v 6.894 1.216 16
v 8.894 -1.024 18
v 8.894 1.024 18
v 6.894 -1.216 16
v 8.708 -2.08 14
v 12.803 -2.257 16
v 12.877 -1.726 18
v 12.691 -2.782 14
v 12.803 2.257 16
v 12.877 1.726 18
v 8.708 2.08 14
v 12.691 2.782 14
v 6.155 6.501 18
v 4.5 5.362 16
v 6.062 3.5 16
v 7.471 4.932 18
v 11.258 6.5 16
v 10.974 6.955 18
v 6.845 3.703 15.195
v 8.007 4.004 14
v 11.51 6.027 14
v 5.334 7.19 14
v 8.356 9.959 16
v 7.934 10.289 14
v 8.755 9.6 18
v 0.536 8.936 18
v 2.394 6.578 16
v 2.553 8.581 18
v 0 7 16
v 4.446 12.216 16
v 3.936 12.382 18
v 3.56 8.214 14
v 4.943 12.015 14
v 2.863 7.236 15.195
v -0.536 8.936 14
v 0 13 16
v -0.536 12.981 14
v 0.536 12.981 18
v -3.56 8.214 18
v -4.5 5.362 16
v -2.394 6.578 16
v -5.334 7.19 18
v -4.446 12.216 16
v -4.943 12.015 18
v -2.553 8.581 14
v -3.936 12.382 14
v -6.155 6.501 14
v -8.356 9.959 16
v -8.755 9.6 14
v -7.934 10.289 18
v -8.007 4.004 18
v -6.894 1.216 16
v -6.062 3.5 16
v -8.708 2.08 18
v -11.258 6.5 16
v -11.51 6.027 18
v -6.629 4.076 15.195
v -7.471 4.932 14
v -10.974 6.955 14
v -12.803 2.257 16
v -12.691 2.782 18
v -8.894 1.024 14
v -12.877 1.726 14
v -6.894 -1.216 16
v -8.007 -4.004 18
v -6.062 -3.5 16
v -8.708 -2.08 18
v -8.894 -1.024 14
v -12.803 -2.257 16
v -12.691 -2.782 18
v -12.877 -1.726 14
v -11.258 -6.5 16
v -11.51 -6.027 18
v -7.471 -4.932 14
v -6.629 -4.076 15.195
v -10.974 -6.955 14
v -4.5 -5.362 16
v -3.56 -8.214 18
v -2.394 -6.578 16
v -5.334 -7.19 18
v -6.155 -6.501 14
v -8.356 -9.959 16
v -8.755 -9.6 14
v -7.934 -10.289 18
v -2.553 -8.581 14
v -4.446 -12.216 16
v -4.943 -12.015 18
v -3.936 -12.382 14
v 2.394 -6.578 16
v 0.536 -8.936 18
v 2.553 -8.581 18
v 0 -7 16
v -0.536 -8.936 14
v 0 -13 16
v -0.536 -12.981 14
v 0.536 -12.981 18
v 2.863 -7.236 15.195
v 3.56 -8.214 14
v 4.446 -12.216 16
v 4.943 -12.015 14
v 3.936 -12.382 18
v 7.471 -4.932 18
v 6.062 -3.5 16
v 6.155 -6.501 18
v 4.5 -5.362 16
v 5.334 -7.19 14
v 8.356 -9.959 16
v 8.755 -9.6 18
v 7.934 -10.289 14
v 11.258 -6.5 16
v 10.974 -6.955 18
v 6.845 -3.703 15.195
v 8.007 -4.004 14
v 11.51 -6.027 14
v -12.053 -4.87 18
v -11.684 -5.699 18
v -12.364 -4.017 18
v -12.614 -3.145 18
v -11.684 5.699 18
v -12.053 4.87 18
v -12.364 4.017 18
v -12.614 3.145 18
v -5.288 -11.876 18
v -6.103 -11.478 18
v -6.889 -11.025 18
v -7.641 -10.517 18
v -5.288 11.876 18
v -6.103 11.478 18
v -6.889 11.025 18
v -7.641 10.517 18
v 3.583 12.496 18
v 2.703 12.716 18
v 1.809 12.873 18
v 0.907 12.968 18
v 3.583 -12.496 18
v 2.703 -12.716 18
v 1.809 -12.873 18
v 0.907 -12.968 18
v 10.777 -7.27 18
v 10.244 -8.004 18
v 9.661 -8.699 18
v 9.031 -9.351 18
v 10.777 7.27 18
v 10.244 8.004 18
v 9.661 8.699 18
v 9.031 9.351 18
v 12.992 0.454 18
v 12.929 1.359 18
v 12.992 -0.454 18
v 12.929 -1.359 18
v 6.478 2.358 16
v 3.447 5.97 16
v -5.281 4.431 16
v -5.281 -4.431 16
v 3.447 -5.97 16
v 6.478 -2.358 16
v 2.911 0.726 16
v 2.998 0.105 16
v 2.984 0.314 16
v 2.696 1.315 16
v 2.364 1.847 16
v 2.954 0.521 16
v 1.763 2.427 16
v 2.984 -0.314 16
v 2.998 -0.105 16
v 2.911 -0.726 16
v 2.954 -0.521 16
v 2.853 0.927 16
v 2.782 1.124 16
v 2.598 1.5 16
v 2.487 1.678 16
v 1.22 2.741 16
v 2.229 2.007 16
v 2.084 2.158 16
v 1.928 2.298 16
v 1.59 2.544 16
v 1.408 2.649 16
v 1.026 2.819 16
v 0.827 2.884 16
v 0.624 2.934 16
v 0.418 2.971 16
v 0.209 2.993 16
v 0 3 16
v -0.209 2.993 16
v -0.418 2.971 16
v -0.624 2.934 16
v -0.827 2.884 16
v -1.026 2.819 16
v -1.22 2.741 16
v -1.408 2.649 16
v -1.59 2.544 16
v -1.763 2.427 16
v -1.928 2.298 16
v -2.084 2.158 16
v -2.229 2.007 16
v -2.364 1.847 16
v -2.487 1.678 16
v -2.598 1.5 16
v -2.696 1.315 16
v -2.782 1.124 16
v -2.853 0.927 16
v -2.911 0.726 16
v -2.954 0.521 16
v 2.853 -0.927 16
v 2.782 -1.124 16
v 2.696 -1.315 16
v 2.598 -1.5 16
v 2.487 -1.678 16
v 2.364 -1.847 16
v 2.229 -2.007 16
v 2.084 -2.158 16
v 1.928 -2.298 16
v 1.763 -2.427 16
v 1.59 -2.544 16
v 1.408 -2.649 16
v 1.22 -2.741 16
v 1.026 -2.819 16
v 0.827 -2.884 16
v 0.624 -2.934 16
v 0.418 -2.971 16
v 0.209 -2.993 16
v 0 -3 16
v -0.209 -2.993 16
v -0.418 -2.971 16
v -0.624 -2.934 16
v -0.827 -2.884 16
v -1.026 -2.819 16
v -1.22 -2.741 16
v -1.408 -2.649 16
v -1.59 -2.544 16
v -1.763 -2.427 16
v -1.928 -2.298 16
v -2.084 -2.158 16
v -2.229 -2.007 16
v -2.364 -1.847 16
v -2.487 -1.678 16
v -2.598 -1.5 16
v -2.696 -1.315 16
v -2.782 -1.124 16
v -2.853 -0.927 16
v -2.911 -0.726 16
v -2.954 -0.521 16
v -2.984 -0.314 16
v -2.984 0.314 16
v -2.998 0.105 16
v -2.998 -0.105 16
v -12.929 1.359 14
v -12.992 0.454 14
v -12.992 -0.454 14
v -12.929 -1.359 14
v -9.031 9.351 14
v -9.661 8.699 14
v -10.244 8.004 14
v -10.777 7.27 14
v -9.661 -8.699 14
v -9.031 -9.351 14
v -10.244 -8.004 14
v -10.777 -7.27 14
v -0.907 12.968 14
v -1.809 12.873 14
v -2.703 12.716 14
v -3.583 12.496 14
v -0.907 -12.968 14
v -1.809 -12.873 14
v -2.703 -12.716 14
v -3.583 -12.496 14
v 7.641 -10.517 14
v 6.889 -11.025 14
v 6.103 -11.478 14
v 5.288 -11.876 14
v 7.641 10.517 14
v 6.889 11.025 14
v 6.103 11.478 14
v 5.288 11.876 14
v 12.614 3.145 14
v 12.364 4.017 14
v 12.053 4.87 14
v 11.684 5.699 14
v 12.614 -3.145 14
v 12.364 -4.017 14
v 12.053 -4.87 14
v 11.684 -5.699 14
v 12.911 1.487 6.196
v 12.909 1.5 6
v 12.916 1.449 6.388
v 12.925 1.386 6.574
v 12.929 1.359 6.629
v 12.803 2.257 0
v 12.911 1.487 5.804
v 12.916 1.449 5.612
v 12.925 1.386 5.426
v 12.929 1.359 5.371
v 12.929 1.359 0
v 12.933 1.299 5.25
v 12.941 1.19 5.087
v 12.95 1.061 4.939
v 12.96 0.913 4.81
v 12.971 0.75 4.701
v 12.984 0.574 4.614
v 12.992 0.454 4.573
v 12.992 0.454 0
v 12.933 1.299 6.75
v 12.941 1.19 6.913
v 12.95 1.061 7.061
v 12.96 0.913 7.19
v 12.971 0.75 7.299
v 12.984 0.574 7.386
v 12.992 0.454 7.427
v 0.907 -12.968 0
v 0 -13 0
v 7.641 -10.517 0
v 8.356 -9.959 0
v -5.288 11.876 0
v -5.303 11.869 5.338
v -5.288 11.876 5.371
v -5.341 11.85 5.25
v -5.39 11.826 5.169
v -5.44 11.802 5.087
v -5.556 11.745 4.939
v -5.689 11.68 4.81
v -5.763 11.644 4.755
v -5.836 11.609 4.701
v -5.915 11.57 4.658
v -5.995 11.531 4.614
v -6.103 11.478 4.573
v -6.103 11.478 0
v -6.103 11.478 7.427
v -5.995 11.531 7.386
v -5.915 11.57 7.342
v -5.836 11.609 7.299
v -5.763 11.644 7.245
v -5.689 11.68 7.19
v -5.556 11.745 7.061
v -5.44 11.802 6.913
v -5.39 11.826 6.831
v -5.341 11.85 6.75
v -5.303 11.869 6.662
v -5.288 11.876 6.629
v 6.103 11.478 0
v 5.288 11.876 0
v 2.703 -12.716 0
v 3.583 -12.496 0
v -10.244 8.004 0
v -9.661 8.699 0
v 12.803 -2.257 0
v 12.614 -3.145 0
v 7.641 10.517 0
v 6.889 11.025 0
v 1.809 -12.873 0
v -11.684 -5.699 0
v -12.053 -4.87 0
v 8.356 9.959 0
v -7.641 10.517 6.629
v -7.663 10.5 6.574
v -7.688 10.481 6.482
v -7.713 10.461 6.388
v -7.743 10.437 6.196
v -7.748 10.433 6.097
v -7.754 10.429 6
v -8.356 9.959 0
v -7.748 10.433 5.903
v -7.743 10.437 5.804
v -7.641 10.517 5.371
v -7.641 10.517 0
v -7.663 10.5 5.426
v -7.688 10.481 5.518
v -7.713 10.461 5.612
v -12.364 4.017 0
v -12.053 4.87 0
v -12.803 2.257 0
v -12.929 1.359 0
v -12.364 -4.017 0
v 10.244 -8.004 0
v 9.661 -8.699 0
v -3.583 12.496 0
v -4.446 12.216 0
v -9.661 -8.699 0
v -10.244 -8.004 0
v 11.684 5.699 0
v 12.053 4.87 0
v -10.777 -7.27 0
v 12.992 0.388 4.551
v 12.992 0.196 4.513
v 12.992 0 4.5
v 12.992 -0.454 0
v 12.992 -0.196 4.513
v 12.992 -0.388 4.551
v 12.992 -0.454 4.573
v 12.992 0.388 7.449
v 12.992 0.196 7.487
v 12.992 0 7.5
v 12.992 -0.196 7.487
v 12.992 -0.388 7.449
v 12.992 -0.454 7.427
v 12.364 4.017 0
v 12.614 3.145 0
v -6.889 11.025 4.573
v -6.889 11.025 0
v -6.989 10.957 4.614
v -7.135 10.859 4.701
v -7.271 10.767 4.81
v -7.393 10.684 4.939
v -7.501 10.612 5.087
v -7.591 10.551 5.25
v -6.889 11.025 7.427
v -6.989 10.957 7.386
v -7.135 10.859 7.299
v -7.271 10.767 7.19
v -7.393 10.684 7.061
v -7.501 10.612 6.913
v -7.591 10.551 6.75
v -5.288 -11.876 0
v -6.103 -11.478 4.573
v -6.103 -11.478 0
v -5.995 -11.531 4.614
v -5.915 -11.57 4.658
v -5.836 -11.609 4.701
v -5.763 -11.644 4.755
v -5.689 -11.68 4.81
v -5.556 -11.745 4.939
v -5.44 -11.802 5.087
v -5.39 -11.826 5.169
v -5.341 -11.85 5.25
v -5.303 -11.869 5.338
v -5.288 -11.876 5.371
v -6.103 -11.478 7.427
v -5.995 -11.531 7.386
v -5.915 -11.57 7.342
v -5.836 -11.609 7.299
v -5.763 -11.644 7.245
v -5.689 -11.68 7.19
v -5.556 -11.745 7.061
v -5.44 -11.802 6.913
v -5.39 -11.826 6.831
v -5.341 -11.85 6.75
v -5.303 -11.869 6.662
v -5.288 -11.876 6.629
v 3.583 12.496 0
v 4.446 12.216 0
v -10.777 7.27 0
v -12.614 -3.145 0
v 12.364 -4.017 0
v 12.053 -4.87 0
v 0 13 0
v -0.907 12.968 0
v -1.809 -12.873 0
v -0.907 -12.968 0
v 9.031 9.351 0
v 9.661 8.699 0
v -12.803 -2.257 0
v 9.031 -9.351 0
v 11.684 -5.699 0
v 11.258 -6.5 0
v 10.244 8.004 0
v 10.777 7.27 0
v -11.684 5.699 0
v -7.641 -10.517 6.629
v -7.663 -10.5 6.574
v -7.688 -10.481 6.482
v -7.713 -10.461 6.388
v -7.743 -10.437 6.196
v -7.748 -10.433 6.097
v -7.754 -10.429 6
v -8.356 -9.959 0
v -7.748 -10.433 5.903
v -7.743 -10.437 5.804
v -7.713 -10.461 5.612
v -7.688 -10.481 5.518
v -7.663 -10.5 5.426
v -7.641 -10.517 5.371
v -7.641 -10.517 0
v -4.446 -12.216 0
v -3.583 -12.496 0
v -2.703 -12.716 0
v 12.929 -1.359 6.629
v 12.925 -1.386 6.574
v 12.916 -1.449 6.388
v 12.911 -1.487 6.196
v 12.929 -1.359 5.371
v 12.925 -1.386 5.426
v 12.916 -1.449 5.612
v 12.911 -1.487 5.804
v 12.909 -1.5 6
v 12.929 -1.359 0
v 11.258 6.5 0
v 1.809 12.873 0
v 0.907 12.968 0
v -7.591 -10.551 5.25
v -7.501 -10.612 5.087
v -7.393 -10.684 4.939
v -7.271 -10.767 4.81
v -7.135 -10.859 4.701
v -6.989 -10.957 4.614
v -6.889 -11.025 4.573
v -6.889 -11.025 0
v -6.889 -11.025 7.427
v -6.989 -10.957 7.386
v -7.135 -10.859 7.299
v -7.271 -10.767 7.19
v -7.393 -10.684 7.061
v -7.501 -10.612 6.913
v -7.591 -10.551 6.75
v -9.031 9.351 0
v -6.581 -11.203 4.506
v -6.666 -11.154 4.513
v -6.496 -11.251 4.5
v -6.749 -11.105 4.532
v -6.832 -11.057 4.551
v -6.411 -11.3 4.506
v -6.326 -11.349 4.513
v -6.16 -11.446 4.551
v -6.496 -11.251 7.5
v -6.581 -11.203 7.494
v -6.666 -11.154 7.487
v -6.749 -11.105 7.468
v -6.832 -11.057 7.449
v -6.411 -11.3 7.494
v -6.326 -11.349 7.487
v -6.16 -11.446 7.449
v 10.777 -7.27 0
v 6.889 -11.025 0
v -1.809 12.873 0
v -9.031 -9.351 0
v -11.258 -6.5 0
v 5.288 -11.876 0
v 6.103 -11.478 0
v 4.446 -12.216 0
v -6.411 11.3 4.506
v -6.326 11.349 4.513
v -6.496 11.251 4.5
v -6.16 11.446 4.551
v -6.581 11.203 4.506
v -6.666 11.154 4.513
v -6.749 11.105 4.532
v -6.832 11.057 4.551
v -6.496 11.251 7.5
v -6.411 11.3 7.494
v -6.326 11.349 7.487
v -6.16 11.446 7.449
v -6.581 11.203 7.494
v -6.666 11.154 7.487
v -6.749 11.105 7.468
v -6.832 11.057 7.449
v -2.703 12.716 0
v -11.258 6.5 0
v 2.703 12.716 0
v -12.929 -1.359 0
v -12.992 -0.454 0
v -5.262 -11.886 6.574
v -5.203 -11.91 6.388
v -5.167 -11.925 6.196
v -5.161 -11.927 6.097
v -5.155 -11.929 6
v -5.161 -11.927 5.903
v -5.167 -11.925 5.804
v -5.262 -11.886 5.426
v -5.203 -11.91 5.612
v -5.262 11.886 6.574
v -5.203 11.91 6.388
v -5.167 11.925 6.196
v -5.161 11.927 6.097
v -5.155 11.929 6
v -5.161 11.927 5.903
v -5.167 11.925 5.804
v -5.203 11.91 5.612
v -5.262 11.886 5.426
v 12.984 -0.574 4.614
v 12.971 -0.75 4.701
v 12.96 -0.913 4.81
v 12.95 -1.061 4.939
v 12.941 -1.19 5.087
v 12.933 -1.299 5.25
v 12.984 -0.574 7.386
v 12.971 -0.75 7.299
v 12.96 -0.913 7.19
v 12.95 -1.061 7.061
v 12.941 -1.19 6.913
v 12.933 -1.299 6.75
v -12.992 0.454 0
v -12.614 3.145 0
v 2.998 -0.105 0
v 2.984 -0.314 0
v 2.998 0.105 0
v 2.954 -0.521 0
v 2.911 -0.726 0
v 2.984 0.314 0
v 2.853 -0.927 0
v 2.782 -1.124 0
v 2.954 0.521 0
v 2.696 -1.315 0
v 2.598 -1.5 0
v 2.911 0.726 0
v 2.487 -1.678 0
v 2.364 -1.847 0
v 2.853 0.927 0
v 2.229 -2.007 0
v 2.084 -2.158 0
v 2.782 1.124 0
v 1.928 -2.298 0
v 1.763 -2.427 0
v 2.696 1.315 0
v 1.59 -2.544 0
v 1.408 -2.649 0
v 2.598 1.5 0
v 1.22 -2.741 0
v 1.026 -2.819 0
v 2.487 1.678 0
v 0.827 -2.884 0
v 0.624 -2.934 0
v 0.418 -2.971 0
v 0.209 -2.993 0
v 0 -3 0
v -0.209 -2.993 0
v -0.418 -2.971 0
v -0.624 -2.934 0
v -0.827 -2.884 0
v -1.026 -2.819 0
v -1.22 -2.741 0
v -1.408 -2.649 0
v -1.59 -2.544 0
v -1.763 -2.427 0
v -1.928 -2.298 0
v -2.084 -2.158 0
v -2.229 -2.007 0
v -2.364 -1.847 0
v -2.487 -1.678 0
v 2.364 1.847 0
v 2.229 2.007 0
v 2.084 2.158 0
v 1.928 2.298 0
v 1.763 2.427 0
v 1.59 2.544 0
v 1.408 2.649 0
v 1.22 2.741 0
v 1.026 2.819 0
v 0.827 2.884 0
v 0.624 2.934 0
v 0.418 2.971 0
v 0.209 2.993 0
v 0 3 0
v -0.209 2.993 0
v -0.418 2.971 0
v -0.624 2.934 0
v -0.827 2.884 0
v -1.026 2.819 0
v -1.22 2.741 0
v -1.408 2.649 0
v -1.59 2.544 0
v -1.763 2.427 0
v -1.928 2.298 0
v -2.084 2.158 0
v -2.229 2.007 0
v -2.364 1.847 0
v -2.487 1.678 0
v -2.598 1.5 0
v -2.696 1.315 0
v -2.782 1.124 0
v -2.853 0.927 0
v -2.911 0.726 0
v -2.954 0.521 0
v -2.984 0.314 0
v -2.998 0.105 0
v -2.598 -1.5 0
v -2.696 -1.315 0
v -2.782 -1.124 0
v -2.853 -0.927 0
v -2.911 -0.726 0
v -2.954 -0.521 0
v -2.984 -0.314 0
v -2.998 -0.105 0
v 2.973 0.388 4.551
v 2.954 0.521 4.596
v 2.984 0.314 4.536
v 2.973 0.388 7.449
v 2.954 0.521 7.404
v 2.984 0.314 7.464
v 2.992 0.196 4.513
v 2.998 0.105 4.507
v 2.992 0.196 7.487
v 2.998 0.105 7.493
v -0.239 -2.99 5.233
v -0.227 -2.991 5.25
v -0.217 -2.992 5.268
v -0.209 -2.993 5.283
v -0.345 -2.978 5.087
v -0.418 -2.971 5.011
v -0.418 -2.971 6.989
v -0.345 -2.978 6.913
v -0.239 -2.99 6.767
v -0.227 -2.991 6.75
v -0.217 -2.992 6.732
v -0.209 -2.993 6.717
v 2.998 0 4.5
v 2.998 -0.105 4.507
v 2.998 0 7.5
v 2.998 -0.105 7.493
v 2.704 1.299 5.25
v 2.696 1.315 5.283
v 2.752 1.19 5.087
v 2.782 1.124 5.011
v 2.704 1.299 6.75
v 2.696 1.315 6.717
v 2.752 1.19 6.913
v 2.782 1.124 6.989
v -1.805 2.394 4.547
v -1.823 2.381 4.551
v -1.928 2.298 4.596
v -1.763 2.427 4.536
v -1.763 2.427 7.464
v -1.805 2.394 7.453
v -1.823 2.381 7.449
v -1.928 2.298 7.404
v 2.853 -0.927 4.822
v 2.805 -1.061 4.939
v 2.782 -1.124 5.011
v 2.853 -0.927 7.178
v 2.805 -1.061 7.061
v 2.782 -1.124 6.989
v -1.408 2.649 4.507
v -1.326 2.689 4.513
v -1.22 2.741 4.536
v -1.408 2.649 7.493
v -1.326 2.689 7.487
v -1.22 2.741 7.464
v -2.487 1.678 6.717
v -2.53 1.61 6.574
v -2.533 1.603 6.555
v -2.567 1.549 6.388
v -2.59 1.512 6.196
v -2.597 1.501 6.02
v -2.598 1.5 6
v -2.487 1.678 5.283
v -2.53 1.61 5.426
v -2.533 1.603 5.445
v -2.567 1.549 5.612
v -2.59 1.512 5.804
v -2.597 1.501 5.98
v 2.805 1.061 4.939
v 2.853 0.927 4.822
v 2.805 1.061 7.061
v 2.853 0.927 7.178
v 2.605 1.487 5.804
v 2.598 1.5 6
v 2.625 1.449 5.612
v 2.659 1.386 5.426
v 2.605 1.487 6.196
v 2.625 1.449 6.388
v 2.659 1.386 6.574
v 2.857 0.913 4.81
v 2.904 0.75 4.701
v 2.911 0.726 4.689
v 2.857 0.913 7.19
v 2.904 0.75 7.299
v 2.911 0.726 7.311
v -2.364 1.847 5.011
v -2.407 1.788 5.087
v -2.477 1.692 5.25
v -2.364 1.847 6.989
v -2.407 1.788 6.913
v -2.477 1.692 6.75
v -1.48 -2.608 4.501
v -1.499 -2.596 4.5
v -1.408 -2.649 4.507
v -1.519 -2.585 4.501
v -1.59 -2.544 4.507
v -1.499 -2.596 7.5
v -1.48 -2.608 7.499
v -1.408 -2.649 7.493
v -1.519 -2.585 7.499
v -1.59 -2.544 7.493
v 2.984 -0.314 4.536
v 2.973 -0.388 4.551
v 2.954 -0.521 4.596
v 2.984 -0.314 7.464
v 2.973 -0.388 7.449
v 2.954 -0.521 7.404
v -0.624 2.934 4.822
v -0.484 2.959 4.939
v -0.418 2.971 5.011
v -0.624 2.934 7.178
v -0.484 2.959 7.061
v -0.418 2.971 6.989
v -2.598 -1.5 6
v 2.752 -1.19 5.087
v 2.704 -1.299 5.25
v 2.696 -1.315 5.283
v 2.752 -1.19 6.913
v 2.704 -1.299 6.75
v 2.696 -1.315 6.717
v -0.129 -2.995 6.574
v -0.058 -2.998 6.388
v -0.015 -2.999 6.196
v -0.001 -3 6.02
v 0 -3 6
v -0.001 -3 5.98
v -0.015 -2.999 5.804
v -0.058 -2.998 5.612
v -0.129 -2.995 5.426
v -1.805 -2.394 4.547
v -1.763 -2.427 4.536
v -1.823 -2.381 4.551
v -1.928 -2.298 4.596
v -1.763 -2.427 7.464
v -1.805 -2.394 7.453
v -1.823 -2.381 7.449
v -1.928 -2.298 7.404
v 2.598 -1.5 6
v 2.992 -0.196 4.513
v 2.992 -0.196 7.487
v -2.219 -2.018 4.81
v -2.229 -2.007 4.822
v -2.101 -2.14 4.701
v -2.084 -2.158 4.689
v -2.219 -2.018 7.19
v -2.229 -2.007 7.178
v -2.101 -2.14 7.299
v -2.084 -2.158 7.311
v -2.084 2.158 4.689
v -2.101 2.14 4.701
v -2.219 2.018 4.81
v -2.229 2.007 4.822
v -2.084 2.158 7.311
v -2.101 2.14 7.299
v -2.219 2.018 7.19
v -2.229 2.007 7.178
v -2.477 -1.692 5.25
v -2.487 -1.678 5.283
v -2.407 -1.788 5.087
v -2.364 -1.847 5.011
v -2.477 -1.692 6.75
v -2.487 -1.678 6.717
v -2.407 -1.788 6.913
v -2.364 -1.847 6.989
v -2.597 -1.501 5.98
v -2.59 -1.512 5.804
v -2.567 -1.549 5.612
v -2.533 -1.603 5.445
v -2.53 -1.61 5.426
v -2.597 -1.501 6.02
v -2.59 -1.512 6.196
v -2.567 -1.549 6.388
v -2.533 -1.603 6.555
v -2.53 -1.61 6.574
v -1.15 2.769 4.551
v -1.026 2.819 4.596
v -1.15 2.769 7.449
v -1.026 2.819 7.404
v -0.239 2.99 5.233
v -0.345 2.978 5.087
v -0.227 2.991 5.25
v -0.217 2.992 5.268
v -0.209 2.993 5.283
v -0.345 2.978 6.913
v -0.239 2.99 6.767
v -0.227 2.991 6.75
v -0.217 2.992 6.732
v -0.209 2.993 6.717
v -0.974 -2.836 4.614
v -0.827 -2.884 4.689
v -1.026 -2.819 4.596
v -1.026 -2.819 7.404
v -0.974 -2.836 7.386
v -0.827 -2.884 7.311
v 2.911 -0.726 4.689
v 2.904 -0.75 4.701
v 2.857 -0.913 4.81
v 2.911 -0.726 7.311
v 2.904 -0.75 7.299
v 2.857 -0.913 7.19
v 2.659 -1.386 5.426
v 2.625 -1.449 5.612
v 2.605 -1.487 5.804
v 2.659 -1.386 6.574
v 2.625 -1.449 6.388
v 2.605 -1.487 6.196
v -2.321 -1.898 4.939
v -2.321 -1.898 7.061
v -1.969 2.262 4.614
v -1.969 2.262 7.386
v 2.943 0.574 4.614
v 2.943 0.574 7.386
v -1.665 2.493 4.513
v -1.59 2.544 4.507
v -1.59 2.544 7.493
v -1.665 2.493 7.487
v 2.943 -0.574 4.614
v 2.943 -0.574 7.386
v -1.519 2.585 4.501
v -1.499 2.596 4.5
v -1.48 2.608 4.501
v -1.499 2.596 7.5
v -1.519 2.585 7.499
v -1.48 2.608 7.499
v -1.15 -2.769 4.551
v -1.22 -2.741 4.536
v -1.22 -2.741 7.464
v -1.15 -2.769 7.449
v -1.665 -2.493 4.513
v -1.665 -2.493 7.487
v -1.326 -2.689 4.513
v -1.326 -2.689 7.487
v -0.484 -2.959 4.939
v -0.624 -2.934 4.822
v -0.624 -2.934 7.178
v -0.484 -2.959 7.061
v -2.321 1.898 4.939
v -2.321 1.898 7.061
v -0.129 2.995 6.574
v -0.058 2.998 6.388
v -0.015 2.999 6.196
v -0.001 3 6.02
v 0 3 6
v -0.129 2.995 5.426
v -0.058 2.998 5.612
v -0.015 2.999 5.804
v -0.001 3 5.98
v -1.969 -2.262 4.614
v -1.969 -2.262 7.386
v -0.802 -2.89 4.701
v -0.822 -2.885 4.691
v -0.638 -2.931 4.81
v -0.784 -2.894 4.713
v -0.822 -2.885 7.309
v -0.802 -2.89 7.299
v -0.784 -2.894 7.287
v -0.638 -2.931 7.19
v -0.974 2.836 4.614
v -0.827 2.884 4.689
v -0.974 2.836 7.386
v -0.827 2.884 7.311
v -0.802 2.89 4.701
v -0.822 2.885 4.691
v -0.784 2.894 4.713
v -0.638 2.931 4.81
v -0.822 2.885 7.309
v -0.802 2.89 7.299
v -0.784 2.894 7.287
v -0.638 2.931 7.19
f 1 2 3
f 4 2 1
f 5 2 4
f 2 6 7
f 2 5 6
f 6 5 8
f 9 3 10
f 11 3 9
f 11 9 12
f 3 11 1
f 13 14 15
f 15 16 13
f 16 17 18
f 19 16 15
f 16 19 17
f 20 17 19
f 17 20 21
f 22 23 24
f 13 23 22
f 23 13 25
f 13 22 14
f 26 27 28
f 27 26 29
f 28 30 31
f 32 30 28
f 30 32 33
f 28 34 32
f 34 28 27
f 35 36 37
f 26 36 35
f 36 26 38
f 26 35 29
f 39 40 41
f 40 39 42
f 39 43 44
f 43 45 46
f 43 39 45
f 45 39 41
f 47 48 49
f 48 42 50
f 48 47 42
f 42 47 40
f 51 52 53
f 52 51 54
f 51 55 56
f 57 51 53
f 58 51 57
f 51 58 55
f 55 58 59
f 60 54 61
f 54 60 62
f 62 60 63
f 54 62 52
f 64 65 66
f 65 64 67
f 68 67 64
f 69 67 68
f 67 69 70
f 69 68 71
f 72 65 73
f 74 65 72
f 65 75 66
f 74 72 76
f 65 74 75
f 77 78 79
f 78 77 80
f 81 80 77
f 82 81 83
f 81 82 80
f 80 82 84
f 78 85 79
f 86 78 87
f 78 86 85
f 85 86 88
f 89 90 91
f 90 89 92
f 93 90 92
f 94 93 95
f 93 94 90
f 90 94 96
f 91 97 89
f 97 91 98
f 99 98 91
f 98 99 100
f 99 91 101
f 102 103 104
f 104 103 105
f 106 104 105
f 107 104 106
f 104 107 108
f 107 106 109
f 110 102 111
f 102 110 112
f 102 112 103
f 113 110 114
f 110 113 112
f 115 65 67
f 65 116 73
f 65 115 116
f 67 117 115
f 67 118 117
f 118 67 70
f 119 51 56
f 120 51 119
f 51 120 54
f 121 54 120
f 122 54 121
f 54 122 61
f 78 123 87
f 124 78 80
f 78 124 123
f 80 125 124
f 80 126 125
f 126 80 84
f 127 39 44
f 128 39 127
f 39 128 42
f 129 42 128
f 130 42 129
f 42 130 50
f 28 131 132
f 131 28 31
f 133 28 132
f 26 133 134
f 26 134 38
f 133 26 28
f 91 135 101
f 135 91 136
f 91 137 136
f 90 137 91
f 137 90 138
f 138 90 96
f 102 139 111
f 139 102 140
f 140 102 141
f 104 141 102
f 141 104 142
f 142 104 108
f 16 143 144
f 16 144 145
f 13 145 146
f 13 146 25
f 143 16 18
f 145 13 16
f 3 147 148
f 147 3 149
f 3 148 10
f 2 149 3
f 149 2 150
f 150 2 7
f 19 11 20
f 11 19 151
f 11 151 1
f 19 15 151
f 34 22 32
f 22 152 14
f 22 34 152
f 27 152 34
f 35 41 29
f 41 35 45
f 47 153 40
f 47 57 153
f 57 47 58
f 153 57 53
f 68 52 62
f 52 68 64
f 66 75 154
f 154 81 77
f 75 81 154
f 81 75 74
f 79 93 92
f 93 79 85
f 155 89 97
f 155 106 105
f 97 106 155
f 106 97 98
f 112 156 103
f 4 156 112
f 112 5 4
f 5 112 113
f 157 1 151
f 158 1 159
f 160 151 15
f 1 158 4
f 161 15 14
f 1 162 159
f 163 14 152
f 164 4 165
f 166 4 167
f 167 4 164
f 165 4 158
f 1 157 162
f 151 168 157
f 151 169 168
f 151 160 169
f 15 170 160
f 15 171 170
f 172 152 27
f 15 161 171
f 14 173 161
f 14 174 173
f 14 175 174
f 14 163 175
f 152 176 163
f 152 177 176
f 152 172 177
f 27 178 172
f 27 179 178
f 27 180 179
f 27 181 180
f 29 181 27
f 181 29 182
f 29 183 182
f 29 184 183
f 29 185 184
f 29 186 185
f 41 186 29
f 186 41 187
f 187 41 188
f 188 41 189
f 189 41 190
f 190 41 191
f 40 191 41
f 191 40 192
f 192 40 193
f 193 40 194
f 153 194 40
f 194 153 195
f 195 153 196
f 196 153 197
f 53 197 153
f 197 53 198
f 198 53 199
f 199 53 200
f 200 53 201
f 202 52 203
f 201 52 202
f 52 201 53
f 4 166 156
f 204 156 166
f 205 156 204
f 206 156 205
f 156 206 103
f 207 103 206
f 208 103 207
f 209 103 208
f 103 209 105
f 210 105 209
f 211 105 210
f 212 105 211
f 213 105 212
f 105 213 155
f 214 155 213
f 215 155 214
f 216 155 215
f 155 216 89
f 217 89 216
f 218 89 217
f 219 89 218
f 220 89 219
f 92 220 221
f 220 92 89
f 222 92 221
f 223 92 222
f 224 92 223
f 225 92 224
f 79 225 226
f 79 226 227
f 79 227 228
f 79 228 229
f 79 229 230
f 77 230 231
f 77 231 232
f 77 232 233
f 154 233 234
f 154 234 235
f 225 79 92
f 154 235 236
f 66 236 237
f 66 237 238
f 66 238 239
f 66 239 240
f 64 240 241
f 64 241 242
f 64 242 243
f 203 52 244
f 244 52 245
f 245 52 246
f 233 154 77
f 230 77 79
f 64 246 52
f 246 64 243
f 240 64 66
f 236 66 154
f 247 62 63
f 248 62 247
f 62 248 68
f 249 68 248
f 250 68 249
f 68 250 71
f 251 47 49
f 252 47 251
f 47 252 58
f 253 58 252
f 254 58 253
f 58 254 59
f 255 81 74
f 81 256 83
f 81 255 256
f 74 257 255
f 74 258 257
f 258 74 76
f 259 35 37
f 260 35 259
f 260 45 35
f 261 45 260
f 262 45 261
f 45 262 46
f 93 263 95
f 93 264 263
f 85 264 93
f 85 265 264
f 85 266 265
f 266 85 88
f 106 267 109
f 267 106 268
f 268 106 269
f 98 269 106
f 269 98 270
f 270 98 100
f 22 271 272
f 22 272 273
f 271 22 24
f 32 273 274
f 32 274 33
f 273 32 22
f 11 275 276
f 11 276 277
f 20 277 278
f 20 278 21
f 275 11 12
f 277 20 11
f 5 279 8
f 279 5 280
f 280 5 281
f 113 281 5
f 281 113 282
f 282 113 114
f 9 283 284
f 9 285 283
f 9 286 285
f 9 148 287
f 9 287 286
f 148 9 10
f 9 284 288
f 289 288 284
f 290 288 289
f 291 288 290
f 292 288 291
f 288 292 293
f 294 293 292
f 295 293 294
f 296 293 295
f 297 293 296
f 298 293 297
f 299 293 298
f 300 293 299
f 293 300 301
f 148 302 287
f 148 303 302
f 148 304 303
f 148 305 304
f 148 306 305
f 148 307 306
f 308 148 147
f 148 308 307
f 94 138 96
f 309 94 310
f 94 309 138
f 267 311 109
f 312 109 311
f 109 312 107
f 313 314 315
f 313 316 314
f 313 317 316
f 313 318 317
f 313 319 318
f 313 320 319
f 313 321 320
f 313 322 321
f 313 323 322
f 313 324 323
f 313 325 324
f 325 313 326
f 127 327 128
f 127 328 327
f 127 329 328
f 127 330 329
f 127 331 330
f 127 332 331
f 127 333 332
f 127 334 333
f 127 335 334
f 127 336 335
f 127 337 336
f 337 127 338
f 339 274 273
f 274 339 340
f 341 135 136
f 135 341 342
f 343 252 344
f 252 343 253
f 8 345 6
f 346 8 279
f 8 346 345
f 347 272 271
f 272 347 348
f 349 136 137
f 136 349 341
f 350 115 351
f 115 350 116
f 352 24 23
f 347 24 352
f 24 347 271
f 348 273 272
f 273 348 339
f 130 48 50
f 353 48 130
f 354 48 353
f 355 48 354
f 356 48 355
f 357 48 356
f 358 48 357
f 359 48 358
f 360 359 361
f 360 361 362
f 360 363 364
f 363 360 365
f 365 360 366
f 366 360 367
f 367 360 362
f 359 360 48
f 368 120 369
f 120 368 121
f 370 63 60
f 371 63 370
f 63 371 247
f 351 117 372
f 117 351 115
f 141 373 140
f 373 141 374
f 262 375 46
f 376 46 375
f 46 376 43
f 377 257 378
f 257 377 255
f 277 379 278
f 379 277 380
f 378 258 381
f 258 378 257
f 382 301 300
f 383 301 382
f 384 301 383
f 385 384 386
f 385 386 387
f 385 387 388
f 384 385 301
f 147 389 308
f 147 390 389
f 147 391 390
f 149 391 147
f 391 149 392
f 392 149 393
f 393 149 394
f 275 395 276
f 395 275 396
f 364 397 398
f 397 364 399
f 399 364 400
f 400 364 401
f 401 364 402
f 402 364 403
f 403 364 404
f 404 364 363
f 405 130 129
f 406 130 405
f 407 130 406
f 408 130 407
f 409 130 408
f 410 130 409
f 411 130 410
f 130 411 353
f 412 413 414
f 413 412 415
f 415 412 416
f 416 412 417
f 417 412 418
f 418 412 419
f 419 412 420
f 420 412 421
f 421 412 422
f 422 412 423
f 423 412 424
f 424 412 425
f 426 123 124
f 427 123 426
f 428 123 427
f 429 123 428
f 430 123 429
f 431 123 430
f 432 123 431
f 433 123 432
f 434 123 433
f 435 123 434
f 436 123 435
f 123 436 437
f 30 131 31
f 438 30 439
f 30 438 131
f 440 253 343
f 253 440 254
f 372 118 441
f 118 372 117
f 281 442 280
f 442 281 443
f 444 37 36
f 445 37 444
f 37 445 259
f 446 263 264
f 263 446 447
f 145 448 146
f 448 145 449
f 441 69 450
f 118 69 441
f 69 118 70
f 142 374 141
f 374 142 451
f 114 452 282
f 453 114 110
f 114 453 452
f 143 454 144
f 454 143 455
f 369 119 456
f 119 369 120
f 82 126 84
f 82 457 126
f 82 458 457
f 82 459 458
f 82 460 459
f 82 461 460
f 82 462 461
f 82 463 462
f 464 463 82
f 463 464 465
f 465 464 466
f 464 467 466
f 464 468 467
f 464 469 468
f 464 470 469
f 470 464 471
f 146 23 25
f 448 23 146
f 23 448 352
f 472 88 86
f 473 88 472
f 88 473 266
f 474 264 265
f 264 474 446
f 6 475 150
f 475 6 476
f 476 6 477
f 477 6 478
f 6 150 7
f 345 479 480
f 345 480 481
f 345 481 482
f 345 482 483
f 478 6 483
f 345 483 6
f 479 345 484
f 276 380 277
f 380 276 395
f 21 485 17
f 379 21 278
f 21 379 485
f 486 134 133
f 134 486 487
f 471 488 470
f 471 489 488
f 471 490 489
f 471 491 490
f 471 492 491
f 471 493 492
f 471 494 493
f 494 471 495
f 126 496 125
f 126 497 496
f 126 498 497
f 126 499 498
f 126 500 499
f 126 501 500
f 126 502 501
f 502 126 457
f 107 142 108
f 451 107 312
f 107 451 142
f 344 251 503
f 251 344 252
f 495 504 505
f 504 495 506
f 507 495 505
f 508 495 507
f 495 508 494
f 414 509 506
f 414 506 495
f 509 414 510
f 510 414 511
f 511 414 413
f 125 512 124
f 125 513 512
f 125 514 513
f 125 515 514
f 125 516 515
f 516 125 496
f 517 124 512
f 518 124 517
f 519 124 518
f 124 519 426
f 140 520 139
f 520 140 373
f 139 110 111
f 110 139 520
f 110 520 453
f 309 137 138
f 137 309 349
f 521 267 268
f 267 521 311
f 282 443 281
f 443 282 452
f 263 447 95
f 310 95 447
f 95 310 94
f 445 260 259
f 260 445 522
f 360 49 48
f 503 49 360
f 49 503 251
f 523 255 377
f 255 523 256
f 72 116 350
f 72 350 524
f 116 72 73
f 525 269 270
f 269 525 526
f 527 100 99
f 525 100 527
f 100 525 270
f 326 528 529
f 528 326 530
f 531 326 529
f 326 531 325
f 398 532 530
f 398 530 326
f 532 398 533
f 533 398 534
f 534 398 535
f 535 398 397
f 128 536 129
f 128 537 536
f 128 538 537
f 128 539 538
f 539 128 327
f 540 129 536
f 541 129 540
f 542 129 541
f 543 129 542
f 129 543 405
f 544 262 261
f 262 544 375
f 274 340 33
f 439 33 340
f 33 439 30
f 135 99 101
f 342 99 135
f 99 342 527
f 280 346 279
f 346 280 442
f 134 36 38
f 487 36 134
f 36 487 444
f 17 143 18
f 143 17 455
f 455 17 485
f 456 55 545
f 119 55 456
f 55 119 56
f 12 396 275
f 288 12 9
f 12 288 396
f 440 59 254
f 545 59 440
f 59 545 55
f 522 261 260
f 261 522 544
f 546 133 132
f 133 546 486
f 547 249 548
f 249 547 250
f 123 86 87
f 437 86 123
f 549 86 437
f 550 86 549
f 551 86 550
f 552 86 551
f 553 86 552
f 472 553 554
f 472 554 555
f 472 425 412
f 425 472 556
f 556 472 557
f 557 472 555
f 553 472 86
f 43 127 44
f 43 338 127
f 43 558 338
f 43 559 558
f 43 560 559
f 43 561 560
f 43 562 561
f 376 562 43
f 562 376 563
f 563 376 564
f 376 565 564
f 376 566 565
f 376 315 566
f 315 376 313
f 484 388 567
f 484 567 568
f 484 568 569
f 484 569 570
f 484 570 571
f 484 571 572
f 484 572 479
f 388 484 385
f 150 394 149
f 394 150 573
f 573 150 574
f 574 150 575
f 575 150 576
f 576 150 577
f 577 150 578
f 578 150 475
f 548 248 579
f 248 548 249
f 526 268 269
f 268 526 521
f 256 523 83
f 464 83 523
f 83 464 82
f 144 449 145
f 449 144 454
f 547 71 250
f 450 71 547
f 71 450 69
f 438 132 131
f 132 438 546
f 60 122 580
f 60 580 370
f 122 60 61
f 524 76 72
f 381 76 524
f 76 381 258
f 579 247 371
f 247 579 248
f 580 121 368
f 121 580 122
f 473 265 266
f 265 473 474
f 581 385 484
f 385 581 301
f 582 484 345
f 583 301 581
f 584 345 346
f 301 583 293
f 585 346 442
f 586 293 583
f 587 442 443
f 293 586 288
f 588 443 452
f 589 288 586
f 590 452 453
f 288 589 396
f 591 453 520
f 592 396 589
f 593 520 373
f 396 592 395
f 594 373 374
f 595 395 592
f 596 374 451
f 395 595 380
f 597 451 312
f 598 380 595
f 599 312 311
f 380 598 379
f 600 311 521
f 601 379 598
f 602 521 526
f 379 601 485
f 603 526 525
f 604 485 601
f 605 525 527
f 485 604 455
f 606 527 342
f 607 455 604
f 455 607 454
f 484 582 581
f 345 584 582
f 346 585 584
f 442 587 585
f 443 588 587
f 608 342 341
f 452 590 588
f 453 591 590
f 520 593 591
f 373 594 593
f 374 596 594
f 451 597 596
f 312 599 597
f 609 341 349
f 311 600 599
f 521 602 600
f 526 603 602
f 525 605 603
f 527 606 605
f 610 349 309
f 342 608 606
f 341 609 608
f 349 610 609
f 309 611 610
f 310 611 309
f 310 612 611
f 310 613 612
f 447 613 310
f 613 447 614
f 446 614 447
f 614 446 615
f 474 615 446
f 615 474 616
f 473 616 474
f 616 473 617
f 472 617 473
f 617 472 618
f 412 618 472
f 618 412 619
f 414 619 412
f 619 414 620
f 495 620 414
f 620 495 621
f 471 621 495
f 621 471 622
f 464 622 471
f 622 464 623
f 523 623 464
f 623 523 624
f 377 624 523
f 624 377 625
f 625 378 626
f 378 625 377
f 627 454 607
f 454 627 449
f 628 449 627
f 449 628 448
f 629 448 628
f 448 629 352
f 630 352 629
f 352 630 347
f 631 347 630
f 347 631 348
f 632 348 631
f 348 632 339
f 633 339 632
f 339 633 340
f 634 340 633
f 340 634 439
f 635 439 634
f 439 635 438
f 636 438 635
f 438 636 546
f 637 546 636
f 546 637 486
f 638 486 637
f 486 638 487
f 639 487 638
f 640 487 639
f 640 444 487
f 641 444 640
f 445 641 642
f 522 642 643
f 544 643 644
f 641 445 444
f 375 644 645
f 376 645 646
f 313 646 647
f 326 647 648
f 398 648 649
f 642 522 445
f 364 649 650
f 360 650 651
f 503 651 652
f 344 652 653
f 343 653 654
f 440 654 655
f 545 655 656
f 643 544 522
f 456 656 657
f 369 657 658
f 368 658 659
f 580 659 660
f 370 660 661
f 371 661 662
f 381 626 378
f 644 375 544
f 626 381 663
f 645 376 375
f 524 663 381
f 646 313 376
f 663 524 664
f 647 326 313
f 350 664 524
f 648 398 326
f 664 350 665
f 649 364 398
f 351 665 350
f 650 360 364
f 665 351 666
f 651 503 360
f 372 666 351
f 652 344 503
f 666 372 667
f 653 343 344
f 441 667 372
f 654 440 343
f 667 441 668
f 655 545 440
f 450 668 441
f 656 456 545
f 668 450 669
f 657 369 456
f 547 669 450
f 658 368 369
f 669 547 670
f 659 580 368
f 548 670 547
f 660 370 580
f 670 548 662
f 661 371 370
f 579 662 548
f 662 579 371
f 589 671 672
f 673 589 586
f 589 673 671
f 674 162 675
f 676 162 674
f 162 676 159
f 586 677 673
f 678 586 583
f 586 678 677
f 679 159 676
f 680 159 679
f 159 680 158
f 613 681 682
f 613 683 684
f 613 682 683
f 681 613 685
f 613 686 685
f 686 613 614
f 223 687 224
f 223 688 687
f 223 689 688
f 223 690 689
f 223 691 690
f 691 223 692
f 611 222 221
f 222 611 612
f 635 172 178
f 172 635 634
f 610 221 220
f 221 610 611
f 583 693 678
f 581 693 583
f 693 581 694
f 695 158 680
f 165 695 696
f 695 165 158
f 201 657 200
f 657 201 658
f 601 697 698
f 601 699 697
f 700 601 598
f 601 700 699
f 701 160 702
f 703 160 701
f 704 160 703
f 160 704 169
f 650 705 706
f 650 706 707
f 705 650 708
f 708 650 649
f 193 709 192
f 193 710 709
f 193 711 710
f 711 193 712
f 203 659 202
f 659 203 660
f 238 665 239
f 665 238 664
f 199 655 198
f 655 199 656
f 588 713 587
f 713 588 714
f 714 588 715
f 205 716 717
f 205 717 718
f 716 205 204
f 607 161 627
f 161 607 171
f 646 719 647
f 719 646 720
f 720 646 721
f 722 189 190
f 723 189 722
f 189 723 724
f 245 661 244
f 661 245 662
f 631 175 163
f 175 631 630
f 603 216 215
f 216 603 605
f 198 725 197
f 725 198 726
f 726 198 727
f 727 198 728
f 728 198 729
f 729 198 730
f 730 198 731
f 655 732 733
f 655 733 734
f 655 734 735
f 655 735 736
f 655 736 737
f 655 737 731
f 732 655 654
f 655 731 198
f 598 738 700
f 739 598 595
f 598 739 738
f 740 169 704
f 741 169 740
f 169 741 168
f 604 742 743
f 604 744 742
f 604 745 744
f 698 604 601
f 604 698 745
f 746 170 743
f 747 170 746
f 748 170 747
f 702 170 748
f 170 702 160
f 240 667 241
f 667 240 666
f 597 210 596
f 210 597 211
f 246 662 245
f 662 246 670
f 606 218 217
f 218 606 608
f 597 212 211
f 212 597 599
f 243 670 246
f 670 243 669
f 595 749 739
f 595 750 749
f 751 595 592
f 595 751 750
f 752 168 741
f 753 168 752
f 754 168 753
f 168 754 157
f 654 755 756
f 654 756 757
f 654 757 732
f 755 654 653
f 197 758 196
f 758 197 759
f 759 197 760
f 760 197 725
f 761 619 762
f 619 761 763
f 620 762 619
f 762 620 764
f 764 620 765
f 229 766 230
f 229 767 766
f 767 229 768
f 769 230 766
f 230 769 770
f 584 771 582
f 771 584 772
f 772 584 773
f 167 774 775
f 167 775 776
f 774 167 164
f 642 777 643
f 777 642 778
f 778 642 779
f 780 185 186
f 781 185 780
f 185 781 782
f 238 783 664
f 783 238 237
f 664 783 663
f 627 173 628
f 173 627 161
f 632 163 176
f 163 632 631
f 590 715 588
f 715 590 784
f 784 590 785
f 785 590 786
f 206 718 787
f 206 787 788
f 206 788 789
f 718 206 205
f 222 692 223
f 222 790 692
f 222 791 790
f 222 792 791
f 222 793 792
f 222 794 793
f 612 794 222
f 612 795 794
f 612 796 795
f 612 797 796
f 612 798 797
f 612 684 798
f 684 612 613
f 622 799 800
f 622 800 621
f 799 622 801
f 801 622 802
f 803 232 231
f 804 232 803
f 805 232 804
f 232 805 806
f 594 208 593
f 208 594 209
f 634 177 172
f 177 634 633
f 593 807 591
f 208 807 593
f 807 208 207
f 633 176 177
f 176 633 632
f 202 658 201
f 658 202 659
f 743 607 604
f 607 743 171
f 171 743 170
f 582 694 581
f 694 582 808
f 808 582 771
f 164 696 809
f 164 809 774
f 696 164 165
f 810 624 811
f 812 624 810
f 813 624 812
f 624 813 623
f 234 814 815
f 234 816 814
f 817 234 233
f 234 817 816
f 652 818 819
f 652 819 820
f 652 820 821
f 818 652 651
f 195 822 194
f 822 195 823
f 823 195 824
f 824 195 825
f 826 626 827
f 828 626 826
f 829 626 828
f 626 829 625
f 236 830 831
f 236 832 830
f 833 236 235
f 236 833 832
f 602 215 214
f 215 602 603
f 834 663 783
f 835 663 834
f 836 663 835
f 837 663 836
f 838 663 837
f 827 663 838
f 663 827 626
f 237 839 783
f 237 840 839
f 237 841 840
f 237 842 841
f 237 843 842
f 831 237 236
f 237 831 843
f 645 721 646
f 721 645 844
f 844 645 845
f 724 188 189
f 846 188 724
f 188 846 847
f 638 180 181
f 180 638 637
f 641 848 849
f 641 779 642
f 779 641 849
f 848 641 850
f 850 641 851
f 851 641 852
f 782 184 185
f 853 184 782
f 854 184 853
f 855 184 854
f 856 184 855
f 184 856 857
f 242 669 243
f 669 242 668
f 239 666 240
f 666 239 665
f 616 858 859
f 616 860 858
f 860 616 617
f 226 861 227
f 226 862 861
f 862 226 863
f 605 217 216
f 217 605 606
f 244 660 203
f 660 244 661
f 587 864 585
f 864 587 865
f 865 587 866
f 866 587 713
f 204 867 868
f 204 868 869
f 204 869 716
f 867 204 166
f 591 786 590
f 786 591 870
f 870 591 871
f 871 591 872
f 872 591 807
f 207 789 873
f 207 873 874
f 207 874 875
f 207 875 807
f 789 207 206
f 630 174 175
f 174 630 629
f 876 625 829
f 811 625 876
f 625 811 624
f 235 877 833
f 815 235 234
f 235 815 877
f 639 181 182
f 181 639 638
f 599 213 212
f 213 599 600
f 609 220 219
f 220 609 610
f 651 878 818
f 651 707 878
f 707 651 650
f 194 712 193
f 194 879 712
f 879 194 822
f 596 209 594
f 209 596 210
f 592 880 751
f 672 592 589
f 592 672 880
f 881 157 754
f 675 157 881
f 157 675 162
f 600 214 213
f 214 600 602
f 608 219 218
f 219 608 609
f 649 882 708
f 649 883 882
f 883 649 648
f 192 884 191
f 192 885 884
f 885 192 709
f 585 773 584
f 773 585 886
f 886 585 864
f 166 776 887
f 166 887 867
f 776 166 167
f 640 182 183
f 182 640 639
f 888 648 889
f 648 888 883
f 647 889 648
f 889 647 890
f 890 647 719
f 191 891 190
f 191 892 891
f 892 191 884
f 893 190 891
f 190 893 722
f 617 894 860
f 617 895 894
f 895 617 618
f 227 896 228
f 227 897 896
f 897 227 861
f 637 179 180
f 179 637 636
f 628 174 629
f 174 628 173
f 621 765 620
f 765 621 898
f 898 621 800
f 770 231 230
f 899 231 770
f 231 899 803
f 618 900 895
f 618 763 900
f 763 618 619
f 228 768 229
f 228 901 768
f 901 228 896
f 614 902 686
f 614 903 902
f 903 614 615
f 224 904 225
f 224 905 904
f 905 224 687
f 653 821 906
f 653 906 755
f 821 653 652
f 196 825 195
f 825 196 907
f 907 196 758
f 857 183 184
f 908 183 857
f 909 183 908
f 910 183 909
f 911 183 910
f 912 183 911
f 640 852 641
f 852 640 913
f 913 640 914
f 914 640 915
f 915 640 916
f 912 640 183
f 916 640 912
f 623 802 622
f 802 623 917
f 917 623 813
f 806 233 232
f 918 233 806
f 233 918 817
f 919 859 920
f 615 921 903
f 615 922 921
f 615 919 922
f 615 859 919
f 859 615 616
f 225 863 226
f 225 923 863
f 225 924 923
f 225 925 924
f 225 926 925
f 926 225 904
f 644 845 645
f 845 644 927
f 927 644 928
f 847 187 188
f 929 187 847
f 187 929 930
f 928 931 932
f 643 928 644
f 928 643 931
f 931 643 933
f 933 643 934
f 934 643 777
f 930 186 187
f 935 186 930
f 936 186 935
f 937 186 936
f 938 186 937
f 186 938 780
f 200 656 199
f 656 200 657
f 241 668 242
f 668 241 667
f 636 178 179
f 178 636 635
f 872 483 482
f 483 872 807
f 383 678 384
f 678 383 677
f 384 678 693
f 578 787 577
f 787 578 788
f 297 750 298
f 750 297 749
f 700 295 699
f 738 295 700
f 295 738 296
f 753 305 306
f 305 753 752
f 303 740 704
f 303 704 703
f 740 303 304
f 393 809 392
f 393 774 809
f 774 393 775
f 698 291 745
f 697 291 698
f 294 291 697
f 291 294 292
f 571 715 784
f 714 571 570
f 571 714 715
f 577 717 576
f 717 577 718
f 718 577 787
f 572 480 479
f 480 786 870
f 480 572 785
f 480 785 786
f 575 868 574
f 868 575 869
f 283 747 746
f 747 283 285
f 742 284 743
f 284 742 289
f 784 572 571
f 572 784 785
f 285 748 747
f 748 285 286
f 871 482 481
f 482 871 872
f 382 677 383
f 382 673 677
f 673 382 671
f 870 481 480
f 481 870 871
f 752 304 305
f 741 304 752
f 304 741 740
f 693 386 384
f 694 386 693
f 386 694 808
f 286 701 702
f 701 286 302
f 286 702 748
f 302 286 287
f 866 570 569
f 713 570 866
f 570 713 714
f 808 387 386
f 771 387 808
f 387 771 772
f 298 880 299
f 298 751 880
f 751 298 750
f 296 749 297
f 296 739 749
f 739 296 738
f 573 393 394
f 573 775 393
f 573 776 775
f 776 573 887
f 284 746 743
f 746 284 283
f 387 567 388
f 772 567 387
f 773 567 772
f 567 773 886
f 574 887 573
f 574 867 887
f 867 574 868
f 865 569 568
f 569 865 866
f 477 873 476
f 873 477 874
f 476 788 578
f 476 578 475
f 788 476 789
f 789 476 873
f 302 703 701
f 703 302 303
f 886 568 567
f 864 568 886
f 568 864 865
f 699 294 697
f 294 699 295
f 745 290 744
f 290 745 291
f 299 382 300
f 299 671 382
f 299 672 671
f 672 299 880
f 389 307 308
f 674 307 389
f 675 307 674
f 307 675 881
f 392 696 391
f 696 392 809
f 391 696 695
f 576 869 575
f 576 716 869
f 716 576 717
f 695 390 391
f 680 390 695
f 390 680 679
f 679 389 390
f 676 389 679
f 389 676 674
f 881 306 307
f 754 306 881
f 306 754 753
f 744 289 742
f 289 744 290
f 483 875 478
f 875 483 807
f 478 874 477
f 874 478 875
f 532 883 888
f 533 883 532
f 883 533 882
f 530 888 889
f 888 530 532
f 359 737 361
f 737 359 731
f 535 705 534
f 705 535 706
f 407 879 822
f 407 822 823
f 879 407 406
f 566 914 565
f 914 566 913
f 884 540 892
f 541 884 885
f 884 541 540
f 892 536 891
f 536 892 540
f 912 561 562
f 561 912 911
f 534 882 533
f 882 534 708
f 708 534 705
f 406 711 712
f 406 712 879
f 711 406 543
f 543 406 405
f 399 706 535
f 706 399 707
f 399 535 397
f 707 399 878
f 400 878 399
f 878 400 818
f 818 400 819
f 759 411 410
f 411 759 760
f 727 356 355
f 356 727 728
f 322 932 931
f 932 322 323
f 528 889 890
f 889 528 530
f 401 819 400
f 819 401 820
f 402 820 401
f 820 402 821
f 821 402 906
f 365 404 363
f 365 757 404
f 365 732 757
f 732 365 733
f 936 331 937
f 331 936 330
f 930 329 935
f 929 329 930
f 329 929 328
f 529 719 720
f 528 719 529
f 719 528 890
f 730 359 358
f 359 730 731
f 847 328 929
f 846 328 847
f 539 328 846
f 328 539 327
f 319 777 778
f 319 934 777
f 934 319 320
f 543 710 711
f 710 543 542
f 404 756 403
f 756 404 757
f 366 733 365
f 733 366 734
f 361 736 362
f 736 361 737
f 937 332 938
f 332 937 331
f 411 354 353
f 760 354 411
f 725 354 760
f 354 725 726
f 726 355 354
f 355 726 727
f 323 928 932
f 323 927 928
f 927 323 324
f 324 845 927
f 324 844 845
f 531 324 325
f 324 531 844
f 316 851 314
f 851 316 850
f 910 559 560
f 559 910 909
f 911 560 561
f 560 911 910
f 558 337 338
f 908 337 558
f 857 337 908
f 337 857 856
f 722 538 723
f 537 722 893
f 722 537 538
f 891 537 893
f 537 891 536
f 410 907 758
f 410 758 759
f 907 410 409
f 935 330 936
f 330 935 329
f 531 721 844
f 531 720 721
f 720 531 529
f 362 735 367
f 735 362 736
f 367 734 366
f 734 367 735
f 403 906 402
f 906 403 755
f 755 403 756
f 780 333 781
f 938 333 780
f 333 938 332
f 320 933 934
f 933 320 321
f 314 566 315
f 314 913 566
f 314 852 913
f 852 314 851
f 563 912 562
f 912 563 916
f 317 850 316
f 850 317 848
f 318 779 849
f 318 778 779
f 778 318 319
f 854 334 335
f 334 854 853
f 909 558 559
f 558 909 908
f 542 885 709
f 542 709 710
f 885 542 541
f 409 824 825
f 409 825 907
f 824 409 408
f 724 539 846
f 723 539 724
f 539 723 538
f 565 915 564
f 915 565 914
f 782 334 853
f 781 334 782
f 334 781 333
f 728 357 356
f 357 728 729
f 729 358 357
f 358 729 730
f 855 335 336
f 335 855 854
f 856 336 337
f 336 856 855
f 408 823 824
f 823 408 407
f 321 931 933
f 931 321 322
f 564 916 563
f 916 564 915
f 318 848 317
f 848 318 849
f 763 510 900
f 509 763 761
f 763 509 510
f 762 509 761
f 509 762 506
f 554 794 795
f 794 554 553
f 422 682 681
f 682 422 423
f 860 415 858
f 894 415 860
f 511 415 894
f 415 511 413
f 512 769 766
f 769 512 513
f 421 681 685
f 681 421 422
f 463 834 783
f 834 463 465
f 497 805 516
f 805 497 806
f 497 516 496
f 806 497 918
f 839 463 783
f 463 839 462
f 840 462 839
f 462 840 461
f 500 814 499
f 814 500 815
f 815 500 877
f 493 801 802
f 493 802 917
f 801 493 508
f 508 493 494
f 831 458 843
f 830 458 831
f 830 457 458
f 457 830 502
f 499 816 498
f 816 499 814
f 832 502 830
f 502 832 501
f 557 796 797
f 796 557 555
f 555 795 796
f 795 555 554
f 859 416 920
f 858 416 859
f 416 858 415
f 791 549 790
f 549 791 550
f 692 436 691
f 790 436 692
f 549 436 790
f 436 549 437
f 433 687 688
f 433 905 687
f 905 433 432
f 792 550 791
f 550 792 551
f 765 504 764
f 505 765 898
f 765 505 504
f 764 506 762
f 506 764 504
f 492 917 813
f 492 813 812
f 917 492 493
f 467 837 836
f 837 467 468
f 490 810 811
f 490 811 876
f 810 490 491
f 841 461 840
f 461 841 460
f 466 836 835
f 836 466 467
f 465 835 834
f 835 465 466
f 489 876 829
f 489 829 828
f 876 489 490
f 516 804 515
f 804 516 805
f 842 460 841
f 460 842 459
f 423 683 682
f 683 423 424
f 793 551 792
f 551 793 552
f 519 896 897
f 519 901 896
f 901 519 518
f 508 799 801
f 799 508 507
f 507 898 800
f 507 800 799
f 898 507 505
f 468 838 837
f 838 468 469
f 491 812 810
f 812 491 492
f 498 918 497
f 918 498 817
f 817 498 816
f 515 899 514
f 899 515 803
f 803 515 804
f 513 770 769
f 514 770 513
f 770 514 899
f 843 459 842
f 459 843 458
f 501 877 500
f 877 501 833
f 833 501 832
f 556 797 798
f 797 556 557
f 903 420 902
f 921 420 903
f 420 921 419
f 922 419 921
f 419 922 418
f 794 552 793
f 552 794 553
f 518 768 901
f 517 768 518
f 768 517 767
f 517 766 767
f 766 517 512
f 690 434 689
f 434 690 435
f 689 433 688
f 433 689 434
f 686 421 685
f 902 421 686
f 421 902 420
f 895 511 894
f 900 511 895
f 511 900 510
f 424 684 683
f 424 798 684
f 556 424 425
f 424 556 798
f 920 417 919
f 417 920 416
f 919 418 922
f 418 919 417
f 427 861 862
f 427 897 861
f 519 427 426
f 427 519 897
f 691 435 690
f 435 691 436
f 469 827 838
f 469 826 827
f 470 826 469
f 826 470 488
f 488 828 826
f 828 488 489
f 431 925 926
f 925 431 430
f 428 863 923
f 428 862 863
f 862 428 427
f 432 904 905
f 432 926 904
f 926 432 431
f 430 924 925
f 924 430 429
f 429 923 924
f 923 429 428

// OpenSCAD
// author:  Lukas Süss aka mechadense
// date:    2014-07
// title:   Hirth-Joint (CSG version)
// license: public domain

/*
Customizable Hith Joint (CSG version) (library)

This is an improved version of
http://www.thingiverse.com/thing:387292

This improved model can start the teeth not just at the center but also at a polygon of choosable radius. Meaning one can create thin walled tube couplings that are radially self centering (Such couplings are often found in Mountainbike axles).

The interpenetration depth of the teeth can be limited with the flatlimit parameter.


## Specialised functions
hirthaxle(l,d,dbore,n,beta,delta,flatlimit)
hirthtube(l,d,dbore,n,beta,delta,flatlimit)
"axle"-postfix: all teeth converge to the center
"tube"-postfix: all teeth emerge from the polygon inscribed into the bore diameter

## Convinience functions that make the coupling printeable upside down:
supportlesshirthaxle(l,d,dbore,n,beta,delta,flatlimit)
supportlesshirthtube(l,d,dbore,n,beta,delta,flatlimit)
"supportless"-prefix: optimized for upside down supportless printability

## Full functonatlity:
hirth(l,d,dbore,dpolygon,n,beta,delta,flatlimit,inlimit)
rawhirth(beta,delta,n,dpolygon,flatlimit,inlimit)

Notes regarding the first design:
* The parametric interdependencies behave a little different in this model!
* Using volumetric CSG descriptions turns out to be a lot easier than triangle vertex juggling.

###################

TODO:

refactor:
d0 -> dout0
dbore0 -> din0
same for 00's

Maybe:

Add an asymmetry parameter "ddelta" that rotates the teeth upwards and a "dbeta" to compensate for the emerging difference in tooth bottom- and top-wideness. Since the coupling becomes asymmetric a countermpart needs to be made from negative space.
make grid with random parameters -- echo(rands(0,10,2));

Check if inward facing (or combined inward outward) teeth are possible too.
=> seems nontrivial


Known problems:
  using rawhirth(...) with intersection works fine
  using rawhirth(...) with difference not - why ??
*/


// ##########################


/* [Character] */

// symmetry
  n0 = 9; // [2:60]
// flank angle
  beta0 = 15;
// cone angle (>0)
  delta0_ = 45;
  delta0 = abs(delta0_);
// size of flat center polygon (edge to edge)
  dpolygon0 = 14;

// (ab)using 0 is BAD!
// maximum interlocking/interpenetration depth  (0.. no limit)
  flatlimit0 = 2;
// 0 -> improve upside down printability
  inlimit00 = 1; // [0:1]
  inlimit0 = (inlimit00==0) ? false : true;




/* [Size] */

// height of hirth-joint bottom to center
  l0 = 16;
// outer hirth-coupling diameter
  d00 = 26;
// size of center bore
  dbore00 = 6;

// outer polygon diameter: [0...corner to corner | 1...width across flats]
measureout = 1; // [0:1]
// inner polygon diameter: [0...corner to corner | 1...width across flats]
measurein = 1; // [0:1]

// (ab)using 0 is BAD!
// number of outer edges (0...circle)
  nout0 = 0; // [0,3,4,5,6,7,8,9,10,11,12]
// number of inner edges (0...circle)
  nin0 = 0; // [0,3,4,5,6,7,8,9,10,11,12]

d0 = (measureout==0 || nout0==0 ) ? d00 : d00 / cos(360/(nout0*2));
dbore0 = (measurein ==0 || nin0==0 ) ? dbore00 : dbore00 / cos(360/(nin0 *2));



/* [Resolution] */

  $fa = 4;
  $fs = 0.2;

// Openscad internal stuff needed to be reimplemented:
function resol(r) = min(360/$fa, max(6,2*3.1415*r/$fs)); 



/* [Sidehole] */

// hight of sidehole for wormscrew (or whatever)
  hsidehole = 6;
// diameter of sidehole for wormscrew (or whatever)
  dsidehole = 3;
// number of sideholes
  nsidehole = 3;



/* [Keep big] */

s0 = 50;



/* [Hidden] */

colorred   = [1,0.3,0.2]*1;
colorgreen  = [0.15,0.65,0.1]*1;
colorblue = [0.3,0.4,0.7]*1;

explx = 16*1;
exply = 30*1;
exply2 =25*1;
shift = 3*1;
eps = 0.05*0;

// ##################################
// -------------------------------- examples

customizable();
//demo();


// customizer default parameter part (tube-example)
module customizable()
{
  difference()
  {
    color(colorred) translate([0,0,l0+eps]) // <<<<<<< color hack
      hirth(l0,d0,dbore0,dpolygon0,n0,beta0,delta0,flatlimit0,inlimit0);
    for(i=[0:nsidehole-1])
    {
      rotate(360/nsidehole*i,[0,0,1])
      translate([0,0,hsidehole]) rotate(90,[0,1,0])
        cylinder(r=dsidehole/2,h=d0);
    }
  }
}


module demo()
{
  translate([shift,0,10])
  {
    translate([-explx,-exply2,0])
      axledemo();
    translate([-explx,+exply2,0])
      axledemo(2,true);

    translate([+explx,-exply,0])
      tubedemo();
    translate([+explx,+exply,0])
      tubedemo(3,true); // for supportless upside down printing
  }
}



module axledemo(flatlimit = 0, inlimit = false) // backwardcapability-demo
{
  color(colorgreen)
  if(!inlimit)
  {   hirthaxle(10,20,3,6,15,12.5,flatlimit);  } else
  {   supportlesshirthaxle(10,20,6,5,15,25,flatlimit);  }
}


module tubedemo(flatlimit = 0, inlimit = false)
{
  color(colorblue)
  if (!inlimit)
  {  hirthtube(10,32,20,8, 5,45, flatlimit);  } else
  {  supportlesshirthtube(10,32,20,12, 5,45, flatlimit);  }
}



// -----------------------------------  convenience functions



// axle couplings
module hirthaxle(l,d,dbore,n,beta,delta,flatlimit)
{
  dpolygon = 0; inlimit = true;
  hirth(l,d,dbore,  0  ,n,beta,delta,flatlimit,  inlimit); 
}
// axle couplings && well upside down printable
module supportlesshirthaxle(l,d,dbore,n,beta,delta,flatlimit)
{
  dpolygon = 0; inlimit = false;
  hirth(l,d,dbore,  0  ,n,beta,delta,flatlimit,  inlimit);
}



// for self centering tube couplings
module hirthtube(l,d,dbore,n,beta,delta,flatlimit)
{
  dpolygon = dbore; inlimit = true;
  hirth(l,d,dbore,  dpolygon , n,beta,delta,flatlimit,  inlimit);
}

// for self centering tube saped couplings  &&  well upside down printable
module supportlesshirthtube(l,d,dbore,n,beta,delta,flatlimit)
{
  dpolygon = dbore; inlimit = false;
  hirth(l,d,dbore,  dpolygon  ,n,beta,delta,flatlimit,  inlimit);
}


// ------------------------------------- fundamental functions

// basic hirth joint cut to a cylindrical ring 
module hirth(l,d,dbore,dpolygon,n,beta,delta,flatlimit,inlimit)
{

  cornersout = (nout0==0) ? resol(d/2) : nout0;
  cornersin  = (nin0==0) ? resol(dbore/2) : nin0;

  difference()
  {
    intersection()
    {
      rawhirth(dpolygon,n,beta,delta,flatlimit,inlimit);
      rotate(360/(cornersout*2),[0,0,1])
        cylinder(r=d/2,h=2*l,center=true,$fn=cornersout);
    }

    // unintuitive ugly hack
    // to avoid further parameter <<<<<<<<<<<<<<<<<<<<<<<<<<<<<<<
    //checking (dbore == dpolygon) woud lead to unintuitive behaviour 
    if(inlimit != false || true) 
    {
      rotate(360/(cornersin*2),[0,0,1])
        cylinder(r=dbore/2,h=2.2*l,center=true,$fn=cornersin);
    }
    else // disabled
    { 
      rotate(360/n/4,[0,0,1])
        // polygon avoids blade arcs
        cylinder(r=dbore/2,h=2*(l0+eps),center=true,$fn=2*n);
    }

  }
}

// "infinite" sized raw hirth coupling ( if hs() where a true halfspace )
module rawhirth(dpolygon,
                n,
                beta,
                delta,
                flatlimit  = 0,
                inlimit = false,
                s = s0)
{
  // size of flat center polygon (side to side)
  shift = dpolygon*cos(360/n/4);

  // angle per period
  a = 360/n;

  // outward upward flanks
  intersection()
  {
    for(i=[0:n-1])
    {
      rotate(360*i/n,[0,0,1])
      intersection()
      {
        translate([shift/2,0,0]) 
        rotate(-delta,[0,1,0]) hs(s);
        rotate(-a/4,[0,0,1])
        rotate(+(90-beta),[1,0,0]) hs(s);
        rotate(+a/4,[0,0,1])
        rotate(-(90-beta),[1,0,0]) hs(s);
      }
    }
    if (flatlimit!=0) { translate([0,0,flatlimit]) hs(s); }
  }

  // inward downward flanks and solid lower body
  union()
  {
    intersection()
    {
      intersection_for(i = [0 : n])
      {
        rotate(360*(i+1/2)/n,[0,0,1])
        translate([shift/2,0,0]) 
        rotate(+delta,[0,1,0]) hs(s);
      }
      hs(s);
    }
    if(flatlimit!=0 && inlimit == true)
    { 
      // cut the teeth bottoms off (flat)
      translate([0,0,-flatlimit0]) hs(s);
    }
     
  }

}


// halfspace (big-cube-approximation)
module hs(s)
{
  translate([0,0,-s/2])
    cube([s,s,s],center=true);
}
